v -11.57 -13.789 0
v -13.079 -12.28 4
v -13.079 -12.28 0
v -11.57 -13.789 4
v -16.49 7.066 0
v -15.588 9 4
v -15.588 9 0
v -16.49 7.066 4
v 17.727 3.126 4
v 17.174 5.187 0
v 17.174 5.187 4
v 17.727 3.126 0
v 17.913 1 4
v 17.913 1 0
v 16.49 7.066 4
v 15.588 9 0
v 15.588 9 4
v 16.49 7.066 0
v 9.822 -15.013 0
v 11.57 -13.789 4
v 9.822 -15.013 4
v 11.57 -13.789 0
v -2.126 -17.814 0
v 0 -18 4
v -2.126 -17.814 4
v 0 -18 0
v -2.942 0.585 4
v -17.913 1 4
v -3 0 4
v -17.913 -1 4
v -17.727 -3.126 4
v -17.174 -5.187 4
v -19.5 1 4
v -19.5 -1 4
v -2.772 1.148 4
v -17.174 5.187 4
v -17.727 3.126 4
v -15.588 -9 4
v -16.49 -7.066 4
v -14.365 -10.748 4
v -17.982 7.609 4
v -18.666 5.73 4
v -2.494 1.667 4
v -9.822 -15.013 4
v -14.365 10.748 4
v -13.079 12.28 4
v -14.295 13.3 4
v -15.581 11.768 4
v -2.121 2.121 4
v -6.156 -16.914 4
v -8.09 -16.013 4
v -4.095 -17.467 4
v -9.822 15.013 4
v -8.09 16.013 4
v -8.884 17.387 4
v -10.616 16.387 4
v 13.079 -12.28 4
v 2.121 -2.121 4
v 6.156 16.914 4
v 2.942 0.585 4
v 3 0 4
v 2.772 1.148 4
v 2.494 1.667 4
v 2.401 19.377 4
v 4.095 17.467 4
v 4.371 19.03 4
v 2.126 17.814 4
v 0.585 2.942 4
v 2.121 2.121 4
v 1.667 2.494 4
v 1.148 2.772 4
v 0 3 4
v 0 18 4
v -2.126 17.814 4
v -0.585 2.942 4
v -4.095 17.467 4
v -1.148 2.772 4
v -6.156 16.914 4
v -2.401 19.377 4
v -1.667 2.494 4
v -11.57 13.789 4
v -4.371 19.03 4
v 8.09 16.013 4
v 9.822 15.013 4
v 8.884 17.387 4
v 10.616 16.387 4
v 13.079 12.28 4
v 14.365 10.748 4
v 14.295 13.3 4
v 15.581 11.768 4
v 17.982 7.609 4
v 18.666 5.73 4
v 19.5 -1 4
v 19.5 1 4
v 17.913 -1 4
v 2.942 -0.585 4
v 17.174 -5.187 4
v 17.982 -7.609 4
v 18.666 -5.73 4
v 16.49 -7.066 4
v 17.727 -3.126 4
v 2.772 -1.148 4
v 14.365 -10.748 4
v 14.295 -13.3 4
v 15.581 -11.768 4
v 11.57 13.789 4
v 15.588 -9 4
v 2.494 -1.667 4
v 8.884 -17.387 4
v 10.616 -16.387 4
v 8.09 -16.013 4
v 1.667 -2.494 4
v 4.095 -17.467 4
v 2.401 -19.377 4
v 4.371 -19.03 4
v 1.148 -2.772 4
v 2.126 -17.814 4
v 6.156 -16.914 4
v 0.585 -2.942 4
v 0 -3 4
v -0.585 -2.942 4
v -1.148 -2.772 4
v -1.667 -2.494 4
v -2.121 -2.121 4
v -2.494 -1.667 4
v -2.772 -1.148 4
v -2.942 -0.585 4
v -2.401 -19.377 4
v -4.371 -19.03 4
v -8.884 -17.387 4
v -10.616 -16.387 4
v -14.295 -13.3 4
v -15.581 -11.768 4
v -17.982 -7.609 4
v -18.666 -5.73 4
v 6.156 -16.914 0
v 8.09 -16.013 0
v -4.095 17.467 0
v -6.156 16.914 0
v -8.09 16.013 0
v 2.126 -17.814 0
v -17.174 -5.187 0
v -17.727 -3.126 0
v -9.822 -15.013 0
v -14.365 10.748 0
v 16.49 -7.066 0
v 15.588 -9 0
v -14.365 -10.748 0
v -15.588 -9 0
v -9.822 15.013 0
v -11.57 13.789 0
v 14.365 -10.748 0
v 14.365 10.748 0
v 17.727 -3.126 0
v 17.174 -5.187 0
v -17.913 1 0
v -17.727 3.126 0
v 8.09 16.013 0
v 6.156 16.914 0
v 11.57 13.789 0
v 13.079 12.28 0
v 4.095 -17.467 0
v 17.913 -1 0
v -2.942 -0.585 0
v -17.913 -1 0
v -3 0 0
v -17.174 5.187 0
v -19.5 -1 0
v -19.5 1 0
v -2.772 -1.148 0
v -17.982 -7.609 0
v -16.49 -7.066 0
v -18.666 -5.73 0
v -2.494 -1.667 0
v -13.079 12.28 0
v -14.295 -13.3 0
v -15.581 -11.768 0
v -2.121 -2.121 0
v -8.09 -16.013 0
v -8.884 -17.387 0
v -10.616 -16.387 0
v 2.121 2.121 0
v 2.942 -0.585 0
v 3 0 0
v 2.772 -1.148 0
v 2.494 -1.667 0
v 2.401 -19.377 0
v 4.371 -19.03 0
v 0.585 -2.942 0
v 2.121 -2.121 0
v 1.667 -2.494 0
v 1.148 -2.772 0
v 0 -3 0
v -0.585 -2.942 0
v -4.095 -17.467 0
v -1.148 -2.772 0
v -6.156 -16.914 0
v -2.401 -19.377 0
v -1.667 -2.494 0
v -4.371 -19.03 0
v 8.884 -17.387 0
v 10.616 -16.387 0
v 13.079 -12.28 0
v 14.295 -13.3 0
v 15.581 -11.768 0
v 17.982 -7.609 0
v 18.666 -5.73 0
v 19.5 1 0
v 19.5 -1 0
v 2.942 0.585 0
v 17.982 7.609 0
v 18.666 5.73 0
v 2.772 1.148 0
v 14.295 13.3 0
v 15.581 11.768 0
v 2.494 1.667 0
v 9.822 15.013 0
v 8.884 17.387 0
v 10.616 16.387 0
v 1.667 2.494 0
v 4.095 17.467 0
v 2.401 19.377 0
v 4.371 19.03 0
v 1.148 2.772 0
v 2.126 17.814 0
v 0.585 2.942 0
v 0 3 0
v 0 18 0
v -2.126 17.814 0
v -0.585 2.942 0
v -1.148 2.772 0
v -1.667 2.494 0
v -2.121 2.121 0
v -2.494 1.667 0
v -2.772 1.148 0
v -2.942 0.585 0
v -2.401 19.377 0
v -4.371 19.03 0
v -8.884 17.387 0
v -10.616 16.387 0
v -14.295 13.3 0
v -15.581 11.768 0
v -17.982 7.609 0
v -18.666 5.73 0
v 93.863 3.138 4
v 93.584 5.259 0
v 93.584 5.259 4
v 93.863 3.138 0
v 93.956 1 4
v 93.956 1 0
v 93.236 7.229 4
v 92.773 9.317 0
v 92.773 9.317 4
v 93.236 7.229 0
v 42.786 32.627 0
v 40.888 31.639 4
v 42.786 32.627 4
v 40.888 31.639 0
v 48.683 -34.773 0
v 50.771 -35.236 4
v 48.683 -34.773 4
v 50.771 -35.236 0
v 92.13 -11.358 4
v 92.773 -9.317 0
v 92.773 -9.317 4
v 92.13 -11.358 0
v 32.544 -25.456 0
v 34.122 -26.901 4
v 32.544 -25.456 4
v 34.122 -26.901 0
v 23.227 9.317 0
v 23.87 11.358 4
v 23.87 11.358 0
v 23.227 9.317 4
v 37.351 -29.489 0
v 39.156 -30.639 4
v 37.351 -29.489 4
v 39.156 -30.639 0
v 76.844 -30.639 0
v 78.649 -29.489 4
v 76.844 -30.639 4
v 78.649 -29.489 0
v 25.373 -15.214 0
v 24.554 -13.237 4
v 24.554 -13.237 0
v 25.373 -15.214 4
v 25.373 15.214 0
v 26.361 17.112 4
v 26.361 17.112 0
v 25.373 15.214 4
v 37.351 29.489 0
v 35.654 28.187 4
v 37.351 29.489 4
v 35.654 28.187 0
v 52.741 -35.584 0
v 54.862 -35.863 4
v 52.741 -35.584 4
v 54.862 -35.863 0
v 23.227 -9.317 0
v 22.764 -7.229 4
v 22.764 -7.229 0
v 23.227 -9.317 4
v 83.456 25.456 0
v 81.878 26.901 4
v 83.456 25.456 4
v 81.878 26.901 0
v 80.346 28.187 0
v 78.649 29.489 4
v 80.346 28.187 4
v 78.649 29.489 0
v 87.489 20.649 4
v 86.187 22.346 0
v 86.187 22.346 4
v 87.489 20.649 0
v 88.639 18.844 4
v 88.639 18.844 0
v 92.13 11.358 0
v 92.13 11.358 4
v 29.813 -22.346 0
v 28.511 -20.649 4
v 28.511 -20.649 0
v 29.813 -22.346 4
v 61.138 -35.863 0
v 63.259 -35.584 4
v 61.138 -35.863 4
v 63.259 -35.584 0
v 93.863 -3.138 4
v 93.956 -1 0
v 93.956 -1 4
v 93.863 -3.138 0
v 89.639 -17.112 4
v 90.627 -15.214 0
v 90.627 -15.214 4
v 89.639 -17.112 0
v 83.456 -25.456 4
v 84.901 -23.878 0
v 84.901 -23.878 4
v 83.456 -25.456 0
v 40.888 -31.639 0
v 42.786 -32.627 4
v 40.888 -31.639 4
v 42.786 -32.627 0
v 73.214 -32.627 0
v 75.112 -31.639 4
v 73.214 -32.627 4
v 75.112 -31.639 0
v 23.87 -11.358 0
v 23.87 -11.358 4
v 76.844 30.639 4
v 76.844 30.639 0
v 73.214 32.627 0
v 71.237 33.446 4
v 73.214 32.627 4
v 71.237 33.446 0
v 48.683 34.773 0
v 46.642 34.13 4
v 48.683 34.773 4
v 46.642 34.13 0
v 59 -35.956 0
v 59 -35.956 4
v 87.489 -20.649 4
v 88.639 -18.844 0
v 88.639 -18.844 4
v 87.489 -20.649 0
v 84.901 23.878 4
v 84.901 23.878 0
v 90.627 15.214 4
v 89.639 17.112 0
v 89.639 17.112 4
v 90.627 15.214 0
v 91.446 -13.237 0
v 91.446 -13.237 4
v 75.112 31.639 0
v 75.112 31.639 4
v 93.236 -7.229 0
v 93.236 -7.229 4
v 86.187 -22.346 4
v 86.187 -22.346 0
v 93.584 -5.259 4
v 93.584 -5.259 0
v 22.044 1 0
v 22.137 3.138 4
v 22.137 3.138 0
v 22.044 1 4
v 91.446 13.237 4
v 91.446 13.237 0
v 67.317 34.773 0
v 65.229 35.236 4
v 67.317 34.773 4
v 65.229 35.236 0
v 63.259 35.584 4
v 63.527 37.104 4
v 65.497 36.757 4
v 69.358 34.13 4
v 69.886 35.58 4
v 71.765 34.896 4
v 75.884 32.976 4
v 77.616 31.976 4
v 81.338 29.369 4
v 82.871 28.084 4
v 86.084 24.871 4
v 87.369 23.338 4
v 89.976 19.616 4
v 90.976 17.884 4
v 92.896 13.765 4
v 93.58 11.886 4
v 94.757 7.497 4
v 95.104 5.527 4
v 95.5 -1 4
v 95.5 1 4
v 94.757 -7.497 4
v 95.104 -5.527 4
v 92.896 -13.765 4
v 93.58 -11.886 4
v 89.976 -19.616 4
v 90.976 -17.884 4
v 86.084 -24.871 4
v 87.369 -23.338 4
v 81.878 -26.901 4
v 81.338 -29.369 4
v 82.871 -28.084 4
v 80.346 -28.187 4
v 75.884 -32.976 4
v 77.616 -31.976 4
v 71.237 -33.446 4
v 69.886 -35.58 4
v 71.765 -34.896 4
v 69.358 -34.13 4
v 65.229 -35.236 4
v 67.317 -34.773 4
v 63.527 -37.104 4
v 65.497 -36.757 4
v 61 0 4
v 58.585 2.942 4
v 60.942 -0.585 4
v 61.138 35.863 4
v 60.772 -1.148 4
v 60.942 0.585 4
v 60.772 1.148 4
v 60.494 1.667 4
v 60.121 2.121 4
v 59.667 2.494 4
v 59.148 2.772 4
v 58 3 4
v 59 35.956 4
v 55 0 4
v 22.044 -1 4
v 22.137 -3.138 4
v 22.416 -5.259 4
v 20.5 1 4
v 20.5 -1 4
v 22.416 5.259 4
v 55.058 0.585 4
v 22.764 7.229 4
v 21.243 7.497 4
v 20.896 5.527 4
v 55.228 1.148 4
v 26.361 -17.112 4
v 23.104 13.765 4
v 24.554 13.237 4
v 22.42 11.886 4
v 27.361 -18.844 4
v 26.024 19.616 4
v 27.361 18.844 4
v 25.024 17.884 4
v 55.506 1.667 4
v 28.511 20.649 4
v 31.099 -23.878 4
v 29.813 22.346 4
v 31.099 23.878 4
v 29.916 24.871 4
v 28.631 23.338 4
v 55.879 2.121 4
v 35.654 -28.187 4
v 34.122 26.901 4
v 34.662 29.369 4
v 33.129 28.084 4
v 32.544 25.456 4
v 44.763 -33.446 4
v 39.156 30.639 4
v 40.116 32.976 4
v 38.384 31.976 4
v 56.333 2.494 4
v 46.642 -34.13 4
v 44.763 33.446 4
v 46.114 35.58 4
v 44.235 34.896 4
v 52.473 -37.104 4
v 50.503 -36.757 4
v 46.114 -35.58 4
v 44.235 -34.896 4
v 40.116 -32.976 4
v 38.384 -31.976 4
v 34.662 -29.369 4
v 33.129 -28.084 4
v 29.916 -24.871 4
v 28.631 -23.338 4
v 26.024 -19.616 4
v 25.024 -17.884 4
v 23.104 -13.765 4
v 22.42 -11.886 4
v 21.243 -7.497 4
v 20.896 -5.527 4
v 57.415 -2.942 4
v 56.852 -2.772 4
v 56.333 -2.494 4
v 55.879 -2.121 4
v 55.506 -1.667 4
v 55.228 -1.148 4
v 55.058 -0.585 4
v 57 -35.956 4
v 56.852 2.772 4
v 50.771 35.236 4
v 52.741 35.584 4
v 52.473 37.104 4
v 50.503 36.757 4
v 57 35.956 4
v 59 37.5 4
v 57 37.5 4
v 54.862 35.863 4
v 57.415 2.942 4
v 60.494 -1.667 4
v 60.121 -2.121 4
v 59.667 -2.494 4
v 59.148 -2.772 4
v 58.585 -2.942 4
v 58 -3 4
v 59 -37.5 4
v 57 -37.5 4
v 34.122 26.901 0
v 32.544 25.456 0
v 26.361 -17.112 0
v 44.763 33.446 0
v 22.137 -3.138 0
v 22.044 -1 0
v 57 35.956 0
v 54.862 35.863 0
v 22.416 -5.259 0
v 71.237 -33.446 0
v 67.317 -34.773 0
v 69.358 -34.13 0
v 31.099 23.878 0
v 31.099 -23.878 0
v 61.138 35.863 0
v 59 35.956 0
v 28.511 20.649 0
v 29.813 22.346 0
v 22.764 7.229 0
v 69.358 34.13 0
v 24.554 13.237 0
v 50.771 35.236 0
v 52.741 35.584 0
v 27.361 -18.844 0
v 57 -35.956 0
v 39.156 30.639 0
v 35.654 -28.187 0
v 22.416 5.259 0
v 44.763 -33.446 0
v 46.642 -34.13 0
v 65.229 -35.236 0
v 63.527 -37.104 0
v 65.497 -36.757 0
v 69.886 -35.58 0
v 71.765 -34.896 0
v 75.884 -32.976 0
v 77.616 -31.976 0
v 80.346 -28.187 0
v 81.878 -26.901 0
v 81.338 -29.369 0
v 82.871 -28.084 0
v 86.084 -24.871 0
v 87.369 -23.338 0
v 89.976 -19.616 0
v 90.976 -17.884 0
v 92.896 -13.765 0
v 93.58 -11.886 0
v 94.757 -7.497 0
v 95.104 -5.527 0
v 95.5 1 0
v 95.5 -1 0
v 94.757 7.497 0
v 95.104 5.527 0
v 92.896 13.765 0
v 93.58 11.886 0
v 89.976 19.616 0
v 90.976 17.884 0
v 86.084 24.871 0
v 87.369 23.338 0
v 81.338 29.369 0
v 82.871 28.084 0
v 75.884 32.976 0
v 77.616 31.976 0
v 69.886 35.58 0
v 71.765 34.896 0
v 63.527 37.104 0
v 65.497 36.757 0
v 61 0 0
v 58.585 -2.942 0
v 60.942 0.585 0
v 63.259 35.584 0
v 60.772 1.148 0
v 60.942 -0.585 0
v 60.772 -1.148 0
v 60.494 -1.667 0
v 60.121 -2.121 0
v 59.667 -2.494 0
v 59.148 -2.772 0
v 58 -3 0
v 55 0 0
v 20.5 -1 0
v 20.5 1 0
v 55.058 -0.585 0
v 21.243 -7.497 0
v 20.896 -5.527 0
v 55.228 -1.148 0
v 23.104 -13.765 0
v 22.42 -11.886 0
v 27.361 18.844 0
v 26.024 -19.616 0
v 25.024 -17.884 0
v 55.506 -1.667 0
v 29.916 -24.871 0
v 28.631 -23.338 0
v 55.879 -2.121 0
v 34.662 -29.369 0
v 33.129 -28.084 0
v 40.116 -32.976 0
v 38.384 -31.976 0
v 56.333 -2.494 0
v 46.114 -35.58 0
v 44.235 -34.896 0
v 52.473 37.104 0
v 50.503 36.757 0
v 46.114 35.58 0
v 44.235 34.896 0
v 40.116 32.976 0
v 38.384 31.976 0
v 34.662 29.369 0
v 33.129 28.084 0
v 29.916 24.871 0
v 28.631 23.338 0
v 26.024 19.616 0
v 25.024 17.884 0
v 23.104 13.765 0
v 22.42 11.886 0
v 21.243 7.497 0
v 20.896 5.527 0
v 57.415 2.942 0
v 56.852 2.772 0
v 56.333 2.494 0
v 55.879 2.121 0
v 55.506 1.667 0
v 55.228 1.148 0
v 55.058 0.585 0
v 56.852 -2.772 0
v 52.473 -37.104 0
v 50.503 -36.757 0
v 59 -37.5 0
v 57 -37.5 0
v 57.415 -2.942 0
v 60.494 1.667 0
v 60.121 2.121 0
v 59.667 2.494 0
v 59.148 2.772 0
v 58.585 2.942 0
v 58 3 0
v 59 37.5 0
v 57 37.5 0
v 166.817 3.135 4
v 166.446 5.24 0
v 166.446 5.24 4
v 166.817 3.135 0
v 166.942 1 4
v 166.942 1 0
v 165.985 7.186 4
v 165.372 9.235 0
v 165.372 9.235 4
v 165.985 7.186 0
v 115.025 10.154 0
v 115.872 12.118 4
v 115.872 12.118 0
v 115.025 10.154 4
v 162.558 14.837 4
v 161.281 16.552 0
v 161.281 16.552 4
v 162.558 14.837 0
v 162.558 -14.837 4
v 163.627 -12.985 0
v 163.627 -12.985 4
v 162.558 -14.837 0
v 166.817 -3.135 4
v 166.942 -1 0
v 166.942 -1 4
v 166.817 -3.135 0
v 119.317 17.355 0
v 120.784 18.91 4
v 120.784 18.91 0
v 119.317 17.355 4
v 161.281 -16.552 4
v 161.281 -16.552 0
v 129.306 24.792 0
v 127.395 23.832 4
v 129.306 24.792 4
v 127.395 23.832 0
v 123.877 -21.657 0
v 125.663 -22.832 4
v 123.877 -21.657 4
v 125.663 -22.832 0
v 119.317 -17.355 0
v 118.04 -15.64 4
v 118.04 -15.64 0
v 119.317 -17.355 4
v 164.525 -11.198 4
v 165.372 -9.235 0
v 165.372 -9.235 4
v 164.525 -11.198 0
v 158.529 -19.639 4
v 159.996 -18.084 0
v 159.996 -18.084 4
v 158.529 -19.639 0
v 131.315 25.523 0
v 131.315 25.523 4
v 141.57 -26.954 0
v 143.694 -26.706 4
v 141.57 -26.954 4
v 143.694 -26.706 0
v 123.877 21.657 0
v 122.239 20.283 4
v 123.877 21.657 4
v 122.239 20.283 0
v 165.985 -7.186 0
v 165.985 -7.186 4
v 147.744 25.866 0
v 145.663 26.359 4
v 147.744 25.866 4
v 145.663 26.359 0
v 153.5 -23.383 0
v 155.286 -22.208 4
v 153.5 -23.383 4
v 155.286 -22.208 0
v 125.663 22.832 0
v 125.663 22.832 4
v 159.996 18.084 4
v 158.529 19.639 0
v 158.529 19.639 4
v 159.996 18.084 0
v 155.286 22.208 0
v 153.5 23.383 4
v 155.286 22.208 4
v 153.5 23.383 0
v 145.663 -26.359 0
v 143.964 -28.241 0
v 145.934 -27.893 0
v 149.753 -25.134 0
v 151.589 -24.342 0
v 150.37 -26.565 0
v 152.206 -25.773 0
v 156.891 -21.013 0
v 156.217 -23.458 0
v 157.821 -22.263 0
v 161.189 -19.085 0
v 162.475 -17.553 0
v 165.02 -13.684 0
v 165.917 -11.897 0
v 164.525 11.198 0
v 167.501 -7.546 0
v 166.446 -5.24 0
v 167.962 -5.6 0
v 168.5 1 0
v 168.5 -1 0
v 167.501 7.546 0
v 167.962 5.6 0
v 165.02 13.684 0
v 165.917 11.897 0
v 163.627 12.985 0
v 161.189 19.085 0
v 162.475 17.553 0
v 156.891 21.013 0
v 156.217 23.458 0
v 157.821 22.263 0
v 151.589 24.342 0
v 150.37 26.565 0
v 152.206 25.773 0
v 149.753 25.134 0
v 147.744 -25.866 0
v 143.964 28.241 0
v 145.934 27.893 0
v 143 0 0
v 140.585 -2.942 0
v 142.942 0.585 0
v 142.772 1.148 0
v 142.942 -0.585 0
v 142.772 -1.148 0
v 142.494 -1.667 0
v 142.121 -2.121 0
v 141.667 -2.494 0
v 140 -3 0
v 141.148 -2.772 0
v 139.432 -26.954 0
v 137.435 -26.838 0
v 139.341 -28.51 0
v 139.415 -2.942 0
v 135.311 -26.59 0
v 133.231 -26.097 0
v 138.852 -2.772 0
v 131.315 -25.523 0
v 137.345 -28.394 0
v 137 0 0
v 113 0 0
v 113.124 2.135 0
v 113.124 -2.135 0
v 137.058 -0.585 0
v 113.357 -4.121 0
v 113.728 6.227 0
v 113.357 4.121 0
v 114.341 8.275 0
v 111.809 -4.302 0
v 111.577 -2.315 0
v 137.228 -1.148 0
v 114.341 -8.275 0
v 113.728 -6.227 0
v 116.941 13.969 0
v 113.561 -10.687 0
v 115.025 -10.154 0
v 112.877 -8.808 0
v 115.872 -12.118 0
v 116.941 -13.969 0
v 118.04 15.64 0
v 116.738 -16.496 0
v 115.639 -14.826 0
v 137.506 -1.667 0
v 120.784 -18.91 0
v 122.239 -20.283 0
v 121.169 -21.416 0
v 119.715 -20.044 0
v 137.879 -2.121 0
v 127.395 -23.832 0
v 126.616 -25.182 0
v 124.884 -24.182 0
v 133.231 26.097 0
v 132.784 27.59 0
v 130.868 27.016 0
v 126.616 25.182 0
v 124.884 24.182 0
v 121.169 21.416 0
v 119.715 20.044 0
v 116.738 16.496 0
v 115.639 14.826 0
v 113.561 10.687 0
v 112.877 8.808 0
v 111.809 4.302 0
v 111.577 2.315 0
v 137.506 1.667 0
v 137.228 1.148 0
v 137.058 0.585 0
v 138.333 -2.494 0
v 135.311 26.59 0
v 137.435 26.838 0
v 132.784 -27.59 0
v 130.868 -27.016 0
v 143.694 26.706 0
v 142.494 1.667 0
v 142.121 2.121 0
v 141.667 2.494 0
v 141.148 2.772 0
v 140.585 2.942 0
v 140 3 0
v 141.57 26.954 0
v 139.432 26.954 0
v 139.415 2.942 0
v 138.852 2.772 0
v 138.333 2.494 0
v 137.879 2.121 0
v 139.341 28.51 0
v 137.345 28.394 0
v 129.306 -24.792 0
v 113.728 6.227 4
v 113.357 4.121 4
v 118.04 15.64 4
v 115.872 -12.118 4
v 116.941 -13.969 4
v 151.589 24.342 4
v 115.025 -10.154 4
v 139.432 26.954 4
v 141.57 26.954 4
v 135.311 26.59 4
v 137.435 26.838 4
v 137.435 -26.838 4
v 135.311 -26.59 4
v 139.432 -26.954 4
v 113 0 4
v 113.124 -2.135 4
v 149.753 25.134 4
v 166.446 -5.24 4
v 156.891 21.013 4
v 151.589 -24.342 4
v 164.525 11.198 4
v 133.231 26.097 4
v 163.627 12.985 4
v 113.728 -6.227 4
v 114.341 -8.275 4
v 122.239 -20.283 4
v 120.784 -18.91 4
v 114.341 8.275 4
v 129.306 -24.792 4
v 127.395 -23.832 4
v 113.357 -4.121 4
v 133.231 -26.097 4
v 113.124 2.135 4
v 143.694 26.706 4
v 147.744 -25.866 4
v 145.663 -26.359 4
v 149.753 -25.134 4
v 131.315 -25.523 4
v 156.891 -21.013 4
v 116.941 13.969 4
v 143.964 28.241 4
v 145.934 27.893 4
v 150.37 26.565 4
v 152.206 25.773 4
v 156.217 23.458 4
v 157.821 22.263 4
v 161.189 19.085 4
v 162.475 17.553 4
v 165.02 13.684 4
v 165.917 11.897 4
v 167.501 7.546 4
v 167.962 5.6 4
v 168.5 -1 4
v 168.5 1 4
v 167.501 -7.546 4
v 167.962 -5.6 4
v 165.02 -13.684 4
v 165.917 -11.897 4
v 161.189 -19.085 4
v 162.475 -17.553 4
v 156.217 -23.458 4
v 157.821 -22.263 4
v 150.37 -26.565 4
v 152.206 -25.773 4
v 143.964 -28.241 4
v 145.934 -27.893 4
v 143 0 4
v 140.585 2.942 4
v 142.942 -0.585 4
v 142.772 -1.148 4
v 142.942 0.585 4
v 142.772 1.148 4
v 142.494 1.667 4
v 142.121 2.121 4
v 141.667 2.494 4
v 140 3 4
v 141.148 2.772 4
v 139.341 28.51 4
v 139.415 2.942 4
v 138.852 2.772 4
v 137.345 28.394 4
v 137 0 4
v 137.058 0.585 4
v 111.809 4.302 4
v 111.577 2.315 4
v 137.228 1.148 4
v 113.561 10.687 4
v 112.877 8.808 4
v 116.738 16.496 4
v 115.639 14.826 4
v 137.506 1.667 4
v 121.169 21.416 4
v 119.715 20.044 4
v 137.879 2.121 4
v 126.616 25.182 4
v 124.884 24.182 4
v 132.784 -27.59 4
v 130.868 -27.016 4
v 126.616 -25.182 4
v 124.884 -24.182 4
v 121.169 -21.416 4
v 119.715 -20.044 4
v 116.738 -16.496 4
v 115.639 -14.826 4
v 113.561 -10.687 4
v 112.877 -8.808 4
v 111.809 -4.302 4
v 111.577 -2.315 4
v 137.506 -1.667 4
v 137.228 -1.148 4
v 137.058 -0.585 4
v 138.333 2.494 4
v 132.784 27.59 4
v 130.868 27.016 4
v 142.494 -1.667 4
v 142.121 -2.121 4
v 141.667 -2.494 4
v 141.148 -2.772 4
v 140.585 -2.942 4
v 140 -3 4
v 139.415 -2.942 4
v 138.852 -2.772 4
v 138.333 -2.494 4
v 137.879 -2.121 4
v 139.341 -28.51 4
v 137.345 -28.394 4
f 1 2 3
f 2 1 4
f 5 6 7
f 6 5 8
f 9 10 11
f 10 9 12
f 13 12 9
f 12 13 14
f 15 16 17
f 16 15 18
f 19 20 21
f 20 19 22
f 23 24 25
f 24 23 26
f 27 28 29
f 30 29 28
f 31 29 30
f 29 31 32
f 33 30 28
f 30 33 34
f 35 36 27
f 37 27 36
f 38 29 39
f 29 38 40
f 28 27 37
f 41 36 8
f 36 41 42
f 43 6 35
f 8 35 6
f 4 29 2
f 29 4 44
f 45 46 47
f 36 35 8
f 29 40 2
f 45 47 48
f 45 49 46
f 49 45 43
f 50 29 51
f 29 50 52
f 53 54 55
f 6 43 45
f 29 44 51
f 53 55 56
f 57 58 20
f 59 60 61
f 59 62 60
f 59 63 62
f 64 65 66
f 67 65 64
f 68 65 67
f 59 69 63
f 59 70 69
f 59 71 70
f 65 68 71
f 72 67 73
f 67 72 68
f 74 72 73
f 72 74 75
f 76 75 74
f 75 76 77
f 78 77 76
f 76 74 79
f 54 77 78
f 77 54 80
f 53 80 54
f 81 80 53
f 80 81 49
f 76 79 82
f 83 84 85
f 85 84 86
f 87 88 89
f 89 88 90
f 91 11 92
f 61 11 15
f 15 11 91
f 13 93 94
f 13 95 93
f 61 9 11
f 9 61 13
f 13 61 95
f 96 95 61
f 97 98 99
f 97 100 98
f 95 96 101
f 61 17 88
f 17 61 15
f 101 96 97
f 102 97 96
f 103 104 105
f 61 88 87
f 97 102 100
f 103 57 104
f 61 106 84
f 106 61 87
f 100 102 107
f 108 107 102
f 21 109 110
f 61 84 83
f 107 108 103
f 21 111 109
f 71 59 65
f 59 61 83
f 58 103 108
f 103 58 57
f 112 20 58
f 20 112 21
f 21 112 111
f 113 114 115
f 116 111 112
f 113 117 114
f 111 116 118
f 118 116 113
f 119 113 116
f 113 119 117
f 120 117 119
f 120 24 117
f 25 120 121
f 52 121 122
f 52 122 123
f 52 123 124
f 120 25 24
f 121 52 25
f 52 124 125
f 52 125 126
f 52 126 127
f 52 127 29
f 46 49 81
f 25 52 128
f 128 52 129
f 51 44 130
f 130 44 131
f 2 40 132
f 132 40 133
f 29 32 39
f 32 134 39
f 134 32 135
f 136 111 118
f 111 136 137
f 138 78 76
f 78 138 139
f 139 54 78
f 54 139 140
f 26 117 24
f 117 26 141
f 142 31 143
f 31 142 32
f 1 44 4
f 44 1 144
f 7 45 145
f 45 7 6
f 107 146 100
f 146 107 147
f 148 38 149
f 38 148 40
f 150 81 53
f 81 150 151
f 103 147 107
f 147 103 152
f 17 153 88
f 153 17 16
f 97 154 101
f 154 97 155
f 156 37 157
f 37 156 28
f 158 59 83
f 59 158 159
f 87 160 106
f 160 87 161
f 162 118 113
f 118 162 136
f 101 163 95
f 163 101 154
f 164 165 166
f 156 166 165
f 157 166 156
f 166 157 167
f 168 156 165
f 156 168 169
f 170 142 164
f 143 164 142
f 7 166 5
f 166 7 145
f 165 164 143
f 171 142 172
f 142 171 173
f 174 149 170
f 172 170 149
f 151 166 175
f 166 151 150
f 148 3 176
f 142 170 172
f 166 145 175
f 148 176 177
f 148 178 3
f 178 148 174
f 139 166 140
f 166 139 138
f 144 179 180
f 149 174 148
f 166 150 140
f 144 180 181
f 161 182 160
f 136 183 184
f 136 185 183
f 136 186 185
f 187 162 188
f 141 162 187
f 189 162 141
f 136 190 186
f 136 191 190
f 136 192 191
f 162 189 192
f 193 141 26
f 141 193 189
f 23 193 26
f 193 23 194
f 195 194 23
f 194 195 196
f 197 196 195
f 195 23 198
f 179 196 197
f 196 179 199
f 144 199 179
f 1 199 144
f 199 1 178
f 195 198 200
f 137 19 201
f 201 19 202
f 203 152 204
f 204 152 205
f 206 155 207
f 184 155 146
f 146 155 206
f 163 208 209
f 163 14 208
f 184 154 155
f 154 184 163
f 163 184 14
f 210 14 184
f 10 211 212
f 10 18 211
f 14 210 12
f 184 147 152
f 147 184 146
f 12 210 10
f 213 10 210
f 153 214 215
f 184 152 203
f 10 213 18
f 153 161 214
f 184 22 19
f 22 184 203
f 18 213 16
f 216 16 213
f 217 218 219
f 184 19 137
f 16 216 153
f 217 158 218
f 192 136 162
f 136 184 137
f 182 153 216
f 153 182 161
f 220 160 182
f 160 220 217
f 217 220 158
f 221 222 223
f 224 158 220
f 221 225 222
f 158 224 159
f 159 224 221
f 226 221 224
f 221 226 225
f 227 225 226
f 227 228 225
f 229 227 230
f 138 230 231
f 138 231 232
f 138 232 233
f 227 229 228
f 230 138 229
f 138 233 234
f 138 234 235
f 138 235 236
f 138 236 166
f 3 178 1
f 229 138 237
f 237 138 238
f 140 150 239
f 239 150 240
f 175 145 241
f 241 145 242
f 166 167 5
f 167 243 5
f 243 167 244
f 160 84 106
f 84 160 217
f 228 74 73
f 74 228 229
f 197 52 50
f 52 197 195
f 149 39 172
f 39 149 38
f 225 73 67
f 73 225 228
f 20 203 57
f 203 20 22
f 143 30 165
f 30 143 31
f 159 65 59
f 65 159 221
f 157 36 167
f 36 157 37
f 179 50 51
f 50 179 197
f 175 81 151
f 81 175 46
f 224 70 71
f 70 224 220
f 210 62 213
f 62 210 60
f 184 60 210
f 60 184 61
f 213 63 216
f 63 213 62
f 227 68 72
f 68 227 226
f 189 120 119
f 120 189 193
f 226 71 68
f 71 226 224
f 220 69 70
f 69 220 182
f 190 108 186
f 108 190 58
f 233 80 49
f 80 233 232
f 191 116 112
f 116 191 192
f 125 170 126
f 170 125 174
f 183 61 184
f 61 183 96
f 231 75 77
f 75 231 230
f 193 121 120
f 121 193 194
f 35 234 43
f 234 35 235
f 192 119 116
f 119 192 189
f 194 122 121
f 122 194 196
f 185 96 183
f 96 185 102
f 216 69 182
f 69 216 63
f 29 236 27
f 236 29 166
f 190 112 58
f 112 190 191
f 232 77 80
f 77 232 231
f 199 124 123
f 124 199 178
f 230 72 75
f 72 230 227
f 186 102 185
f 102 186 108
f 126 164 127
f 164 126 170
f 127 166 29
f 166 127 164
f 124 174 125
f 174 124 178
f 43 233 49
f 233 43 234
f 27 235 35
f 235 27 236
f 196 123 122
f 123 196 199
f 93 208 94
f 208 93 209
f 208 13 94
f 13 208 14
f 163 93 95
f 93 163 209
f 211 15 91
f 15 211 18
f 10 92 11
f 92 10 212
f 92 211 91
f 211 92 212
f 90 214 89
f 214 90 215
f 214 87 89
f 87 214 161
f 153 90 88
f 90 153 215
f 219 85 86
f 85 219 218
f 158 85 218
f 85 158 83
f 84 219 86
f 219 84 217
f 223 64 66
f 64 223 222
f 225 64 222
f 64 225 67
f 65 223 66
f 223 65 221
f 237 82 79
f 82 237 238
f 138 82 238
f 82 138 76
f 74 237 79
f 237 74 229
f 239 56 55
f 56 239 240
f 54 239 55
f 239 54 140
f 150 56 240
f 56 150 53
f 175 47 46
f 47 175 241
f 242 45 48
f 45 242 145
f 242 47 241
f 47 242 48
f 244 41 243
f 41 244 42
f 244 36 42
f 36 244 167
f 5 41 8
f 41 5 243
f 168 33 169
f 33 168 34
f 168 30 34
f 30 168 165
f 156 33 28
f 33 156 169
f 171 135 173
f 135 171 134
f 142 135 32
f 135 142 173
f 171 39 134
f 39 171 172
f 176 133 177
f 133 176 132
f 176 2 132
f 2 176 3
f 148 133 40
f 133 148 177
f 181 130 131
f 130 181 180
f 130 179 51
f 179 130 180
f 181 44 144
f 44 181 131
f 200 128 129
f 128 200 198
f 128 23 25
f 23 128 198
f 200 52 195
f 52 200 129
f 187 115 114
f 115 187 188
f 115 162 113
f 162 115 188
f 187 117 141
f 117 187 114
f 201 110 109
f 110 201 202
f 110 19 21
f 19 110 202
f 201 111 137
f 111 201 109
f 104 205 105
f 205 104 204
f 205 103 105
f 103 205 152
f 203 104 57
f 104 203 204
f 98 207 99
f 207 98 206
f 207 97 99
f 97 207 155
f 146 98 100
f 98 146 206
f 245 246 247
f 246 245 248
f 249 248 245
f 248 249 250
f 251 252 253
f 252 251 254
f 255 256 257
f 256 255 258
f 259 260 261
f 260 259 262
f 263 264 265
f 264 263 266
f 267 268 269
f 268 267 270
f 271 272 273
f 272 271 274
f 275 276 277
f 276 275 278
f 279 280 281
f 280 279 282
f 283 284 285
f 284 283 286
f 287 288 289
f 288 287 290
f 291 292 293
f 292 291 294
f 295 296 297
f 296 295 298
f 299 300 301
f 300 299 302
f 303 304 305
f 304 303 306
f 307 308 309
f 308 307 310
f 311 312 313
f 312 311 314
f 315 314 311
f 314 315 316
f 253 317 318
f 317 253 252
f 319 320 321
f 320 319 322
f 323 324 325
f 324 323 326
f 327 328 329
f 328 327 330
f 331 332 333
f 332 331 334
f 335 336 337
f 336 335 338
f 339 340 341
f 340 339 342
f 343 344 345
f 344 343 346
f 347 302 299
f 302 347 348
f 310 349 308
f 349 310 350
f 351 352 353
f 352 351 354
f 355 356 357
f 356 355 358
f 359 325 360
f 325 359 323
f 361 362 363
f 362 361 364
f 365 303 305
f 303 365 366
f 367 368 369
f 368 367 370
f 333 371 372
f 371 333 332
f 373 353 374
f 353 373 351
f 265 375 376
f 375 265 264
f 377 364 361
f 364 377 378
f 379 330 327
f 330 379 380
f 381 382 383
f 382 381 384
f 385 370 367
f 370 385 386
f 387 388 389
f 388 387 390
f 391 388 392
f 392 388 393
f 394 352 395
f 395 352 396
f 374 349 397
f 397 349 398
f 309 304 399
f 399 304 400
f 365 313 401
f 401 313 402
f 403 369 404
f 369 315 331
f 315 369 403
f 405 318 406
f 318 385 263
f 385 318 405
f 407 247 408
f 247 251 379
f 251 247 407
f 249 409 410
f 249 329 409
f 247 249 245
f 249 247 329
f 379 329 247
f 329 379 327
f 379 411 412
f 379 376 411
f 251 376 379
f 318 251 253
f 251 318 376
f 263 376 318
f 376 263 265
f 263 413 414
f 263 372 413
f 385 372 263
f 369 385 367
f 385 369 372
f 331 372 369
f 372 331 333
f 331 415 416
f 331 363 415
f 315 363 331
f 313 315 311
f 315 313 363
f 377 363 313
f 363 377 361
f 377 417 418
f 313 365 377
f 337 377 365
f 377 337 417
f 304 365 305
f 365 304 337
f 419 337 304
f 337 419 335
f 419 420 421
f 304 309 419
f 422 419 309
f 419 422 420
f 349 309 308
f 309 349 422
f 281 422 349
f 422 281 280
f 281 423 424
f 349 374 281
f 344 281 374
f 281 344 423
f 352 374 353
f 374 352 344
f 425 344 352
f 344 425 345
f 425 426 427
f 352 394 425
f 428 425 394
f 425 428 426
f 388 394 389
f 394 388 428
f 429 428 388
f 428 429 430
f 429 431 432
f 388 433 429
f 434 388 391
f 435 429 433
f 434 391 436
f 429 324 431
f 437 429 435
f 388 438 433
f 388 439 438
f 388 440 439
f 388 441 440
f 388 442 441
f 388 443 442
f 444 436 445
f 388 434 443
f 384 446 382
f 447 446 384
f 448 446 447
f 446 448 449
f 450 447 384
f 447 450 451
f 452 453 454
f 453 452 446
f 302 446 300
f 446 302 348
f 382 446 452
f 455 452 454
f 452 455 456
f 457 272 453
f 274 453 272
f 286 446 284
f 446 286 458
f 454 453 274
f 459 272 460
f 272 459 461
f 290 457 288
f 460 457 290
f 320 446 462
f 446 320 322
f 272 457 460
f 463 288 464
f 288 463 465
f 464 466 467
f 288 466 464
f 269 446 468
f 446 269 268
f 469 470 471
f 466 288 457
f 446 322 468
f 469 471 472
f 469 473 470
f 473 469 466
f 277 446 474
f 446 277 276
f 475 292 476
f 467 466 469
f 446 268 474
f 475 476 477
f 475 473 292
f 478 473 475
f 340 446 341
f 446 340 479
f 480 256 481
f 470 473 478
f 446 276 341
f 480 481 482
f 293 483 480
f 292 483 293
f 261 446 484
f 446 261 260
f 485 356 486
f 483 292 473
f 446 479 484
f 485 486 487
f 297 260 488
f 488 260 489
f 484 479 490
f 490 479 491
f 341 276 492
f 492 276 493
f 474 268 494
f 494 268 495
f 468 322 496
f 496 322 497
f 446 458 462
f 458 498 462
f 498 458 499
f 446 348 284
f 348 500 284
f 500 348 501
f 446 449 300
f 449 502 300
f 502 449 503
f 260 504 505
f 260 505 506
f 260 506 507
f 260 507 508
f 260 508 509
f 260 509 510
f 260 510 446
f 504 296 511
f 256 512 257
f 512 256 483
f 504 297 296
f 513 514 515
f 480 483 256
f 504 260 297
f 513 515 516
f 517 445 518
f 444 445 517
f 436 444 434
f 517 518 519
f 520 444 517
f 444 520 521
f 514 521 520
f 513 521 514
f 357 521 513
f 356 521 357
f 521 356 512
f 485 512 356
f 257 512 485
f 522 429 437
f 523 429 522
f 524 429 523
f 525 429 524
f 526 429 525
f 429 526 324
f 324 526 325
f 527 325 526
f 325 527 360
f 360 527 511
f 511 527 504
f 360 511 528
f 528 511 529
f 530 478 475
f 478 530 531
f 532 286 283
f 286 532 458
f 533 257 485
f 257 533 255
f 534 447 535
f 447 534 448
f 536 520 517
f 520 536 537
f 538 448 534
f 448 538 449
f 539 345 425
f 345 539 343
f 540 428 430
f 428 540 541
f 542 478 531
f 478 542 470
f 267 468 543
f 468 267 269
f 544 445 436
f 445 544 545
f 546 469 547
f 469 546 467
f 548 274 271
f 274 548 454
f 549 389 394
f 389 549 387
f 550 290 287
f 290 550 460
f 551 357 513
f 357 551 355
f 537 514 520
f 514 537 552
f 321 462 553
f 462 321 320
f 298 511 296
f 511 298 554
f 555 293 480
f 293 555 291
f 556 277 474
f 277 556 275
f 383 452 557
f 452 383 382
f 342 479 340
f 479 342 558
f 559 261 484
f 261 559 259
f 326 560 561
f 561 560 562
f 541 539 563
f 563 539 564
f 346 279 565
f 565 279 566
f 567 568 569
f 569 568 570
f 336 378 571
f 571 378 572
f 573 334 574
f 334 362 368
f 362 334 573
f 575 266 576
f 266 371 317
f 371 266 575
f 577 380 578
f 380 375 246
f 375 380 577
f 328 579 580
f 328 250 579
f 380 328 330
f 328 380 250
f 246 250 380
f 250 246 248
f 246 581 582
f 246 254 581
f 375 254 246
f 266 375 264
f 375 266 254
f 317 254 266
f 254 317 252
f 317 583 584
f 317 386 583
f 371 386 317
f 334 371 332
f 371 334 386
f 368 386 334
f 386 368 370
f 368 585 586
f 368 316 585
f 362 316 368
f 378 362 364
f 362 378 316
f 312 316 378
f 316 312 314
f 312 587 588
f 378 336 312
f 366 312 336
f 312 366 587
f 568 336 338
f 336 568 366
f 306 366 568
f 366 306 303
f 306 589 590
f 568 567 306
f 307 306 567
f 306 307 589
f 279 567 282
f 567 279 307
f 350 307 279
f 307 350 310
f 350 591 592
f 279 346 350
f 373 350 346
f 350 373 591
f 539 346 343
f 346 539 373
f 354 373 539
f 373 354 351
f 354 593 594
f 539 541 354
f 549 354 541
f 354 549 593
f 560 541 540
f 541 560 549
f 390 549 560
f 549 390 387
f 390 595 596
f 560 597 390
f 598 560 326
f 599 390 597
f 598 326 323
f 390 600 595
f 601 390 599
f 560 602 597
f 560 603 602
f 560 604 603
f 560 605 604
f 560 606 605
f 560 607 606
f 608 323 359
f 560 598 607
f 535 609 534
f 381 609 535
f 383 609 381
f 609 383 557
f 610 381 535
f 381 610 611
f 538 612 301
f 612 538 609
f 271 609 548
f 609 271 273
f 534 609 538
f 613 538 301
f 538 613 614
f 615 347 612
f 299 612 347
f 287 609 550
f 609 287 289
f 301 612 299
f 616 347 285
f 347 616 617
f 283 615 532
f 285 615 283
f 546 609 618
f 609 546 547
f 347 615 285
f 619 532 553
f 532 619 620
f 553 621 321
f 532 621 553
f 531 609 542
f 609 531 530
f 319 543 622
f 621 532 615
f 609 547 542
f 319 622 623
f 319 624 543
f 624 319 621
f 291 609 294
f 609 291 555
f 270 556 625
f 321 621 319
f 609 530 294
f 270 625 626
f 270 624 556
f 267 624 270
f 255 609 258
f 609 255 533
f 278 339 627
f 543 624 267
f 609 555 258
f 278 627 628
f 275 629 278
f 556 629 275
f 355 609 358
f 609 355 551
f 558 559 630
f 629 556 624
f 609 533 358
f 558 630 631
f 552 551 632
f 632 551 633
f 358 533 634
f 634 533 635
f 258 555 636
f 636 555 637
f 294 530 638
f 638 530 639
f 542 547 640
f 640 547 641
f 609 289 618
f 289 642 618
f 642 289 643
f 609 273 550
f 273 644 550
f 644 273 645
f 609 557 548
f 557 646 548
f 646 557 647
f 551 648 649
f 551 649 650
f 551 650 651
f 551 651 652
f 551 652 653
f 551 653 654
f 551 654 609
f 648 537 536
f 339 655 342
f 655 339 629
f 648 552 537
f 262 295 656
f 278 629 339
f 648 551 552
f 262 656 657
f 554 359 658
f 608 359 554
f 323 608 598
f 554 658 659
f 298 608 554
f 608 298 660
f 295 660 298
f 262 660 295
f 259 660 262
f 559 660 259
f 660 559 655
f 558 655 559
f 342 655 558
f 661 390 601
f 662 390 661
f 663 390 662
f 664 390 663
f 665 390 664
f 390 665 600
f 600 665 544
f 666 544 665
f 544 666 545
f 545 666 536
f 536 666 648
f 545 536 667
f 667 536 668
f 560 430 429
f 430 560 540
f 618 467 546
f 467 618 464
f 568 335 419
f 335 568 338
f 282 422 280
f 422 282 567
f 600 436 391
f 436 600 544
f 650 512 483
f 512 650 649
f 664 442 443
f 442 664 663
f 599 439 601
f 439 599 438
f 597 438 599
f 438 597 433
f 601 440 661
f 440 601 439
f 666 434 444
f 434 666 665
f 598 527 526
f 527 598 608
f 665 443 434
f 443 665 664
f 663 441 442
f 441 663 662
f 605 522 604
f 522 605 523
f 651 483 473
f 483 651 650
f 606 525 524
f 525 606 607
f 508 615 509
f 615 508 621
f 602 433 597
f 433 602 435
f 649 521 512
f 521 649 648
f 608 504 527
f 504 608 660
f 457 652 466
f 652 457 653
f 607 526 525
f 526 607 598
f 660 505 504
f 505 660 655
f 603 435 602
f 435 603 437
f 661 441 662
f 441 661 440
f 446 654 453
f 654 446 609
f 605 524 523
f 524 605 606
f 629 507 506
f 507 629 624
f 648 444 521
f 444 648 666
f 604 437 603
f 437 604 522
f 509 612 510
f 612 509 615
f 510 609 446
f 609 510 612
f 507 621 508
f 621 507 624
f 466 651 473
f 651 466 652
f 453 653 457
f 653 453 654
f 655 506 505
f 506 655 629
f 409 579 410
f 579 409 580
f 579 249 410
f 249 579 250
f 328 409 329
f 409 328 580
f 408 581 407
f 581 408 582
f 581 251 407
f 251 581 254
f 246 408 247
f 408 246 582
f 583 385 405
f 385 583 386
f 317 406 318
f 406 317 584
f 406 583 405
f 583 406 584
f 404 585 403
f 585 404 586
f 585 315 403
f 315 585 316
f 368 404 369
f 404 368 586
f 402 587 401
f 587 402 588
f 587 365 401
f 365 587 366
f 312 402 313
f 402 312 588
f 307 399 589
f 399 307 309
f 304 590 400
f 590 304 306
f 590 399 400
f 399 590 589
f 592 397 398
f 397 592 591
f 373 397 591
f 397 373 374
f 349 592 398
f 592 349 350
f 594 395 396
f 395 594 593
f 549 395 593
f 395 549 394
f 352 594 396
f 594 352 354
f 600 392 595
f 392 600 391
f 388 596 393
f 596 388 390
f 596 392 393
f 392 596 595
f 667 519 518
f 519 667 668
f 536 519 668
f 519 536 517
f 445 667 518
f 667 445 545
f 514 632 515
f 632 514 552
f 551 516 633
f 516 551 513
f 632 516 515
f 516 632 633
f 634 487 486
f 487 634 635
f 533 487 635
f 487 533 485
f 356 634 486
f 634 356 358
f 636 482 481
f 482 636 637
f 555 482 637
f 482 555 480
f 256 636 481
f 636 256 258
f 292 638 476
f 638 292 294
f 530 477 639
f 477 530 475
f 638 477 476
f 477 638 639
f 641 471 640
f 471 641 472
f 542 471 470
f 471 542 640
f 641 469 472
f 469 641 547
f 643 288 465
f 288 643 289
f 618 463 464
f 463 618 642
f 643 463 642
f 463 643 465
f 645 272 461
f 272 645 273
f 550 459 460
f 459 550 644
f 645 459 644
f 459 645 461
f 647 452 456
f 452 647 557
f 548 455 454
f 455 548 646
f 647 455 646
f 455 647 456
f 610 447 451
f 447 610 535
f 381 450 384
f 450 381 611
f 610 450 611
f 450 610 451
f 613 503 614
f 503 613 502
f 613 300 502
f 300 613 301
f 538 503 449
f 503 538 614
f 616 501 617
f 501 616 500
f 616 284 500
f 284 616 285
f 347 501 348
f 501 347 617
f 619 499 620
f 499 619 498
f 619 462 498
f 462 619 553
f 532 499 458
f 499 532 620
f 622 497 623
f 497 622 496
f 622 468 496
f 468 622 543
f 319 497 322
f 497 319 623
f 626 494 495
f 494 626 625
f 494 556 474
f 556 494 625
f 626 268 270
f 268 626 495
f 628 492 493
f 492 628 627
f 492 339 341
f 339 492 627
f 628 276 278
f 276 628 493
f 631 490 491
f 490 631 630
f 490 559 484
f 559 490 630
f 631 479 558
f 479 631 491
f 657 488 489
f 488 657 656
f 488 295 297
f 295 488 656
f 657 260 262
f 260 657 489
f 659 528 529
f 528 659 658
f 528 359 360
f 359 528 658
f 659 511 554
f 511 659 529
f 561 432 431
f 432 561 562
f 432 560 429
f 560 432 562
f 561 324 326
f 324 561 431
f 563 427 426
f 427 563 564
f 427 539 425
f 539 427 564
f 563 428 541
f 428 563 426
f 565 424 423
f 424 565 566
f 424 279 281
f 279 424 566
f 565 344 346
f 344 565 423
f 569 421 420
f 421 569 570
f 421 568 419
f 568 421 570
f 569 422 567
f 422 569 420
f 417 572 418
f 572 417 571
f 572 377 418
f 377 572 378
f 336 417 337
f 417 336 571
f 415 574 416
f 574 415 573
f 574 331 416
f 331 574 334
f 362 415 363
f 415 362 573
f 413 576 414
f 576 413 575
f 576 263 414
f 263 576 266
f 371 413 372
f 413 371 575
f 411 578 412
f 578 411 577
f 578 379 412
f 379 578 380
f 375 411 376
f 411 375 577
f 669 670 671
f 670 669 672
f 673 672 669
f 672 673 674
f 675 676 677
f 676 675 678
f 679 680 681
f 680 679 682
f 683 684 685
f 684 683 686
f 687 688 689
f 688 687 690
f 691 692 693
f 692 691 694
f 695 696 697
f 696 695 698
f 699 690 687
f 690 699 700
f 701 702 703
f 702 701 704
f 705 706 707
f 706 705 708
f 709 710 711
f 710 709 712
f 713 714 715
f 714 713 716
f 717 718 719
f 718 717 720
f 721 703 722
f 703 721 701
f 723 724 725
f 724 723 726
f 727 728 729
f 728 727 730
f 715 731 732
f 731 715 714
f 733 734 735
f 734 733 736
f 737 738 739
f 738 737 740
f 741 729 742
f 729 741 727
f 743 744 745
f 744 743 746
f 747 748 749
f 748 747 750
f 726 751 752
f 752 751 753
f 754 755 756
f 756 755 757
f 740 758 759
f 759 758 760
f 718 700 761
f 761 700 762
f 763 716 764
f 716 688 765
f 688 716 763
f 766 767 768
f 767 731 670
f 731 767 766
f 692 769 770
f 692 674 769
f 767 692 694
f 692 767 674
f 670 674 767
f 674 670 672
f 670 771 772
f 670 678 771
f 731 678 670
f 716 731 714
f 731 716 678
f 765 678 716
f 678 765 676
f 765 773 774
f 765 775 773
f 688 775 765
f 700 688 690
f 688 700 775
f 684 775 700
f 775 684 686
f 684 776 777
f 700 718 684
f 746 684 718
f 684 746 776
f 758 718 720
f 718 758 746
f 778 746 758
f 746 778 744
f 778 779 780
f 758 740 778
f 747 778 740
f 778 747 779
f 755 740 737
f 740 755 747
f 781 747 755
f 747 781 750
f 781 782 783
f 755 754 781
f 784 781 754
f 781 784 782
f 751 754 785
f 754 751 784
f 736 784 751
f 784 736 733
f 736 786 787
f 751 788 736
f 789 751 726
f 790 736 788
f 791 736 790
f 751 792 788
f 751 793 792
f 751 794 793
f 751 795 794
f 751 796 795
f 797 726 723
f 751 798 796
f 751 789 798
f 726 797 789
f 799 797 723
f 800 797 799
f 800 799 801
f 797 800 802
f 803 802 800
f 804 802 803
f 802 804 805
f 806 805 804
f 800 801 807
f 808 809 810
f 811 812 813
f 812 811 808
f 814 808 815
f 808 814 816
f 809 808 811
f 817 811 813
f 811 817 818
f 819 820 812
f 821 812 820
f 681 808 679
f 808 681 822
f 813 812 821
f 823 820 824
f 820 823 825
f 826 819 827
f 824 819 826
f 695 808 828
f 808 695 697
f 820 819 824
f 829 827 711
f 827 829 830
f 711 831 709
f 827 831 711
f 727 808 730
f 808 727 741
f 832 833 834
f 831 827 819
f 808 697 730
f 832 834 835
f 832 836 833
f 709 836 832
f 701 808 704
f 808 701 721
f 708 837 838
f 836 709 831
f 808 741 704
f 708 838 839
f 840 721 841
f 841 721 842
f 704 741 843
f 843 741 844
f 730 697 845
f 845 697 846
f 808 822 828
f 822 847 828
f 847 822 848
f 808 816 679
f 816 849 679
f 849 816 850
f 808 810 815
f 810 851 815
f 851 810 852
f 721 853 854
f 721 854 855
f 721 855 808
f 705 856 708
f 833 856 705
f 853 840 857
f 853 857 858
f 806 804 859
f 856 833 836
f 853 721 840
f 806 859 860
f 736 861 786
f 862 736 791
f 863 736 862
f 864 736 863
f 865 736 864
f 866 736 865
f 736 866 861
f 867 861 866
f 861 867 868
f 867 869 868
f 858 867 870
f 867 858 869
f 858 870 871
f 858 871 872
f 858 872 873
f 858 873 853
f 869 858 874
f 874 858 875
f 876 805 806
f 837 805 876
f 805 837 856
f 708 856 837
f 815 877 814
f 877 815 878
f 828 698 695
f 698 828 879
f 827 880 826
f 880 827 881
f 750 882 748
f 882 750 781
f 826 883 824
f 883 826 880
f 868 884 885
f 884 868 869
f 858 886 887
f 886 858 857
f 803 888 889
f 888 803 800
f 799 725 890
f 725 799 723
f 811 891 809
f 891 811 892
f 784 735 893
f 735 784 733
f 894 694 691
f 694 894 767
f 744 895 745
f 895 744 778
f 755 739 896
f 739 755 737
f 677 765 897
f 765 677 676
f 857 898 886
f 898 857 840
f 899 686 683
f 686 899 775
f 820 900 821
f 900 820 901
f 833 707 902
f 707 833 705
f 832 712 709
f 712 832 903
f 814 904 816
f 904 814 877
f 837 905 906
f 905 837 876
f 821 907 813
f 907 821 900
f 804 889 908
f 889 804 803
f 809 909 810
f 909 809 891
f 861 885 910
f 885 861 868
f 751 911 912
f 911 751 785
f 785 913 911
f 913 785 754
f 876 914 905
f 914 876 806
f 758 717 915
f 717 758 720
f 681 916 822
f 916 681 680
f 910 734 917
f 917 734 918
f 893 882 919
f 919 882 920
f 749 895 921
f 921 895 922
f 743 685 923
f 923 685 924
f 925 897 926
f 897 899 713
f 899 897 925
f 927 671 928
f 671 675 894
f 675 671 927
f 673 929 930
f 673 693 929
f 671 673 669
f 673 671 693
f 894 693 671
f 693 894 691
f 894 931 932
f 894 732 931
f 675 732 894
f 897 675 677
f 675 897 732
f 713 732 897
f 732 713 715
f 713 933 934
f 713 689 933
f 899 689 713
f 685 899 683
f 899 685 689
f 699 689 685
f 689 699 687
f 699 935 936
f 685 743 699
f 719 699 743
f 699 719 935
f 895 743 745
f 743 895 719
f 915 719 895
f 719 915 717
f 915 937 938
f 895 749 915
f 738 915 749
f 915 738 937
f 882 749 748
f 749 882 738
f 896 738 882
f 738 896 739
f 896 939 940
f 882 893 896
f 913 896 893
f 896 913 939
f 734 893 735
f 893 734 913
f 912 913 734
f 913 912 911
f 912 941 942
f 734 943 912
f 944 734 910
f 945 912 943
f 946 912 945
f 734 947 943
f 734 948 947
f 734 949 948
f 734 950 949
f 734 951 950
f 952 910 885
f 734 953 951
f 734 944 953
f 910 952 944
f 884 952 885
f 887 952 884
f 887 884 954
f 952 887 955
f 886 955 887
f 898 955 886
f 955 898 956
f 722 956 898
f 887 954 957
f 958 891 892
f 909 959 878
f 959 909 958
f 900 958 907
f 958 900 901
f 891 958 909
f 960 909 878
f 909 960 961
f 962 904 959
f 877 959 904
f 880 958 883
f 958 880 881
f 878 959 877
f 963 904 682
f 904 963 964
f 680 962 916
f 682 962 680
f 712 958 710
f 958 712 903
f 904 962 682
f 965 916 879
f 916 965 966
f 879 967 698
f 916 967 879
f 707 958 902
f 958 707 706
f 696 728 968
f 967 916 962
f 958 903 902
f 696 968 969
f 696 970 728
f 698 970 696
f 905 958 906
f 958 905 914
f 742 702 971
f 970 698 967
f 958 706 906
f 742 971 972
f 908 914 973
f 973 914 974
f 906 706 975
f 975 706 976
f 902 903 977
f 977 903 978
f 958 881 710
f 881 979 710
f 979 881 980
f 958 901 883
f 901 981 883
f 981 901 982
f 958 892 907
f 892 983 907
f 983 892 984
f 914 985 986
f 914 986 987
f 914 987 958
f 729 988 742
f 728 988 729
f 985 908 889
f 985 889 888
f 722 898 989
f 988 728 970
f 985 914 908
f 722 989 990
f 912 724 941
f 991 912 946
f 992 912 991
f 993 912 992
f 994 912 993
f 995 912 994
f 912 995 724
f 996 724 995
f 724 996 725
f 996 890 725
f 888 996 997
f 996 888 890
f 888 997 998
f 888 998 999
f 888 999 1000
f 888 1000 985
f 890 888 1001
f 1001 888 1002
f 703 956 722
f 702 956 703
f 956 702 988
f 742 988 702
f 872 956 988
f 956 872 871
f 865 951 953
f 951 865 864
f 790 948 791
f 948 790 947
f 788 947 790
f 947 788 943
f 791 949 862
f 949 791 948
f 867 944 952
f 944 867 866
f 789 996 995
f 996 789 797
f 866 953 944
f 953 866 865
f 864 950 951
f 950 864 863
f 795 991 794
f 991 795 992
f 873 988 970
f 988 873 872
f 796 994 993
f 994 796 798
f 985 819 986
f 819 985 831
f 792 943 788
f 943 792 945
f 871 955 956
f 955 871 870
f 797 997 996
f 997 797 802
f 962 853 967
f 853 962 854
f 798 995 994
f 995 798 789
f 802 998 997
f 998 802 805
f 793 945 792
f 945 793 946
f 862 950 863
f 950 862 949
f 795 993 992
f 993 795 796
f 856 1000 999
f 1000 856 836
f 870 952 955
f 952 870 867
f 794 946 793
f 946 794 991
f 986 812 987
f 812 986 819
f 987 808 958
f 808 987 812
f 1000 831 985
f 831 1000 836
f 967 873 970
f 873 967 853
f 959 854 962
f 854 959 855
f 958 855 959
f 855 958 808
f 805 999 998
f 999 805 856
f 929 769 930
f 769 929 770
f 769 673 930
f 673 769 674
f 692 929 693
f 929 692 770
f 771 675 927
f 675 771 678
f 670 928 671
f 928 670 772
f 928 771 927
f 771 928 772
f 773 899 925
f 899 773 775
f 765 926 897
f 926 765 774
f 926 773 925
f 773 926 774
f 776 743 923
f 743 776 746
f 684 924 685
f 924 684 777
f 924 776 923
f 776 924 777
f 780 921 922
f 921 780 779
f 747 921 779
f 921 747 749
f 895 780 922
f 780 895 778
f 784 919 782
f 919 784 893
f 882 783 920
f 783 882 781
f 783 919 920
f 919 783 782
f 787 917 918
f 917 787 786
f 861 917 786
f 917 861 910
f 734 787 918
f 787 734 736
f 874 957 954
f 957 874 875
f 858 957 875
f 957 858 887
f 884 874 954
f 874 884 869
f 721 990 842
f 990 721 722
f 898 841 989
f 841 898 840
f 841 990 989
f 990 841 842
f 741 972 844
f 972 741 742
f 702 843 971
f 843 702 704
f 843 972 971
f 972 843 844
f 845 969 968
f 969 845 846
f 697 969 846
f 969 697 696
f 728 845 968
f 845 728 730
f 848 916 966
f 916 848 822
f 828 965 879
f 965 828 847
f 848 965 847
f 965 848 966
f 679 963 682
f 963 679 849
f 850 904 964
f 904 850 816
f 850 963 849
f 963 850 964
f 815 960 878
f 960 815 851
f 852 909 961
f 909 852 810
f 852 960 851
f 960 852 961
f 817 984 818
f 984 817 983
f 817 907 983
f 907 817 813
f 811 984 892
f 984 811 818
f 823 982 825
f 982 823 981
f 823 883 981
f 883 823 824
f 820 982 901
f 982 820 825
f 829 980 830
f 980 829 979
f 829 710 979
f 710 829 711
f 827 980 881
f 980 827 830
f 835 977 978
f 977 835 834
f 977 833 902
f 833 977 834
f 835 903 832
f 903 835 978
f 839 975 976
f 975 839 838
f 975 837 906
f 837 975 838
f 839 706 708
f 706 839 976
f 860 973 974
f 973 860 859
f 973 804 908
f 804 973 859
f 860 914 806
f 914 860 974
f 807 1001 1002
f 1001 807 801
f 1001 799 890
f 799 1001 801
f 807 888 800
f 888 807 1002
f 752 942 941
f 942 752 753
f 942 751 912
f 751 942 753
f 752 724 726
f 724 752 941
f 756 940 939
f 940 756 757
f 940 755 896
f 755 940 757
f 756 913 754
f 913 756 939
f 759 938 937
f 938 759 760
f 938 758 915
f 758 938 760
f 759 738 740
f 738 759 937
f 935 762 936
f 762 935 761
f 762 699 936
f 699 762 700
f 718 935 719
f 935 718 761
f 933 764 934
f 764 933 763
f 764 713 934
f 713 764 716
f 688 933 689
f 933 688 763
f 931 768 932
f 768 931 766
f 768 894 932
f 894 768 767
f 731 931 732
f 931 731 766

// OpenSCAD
/*
Title: Gear Ratio Visualizer Board
Folder: 17_robotics_applications
Physics Topic: Gear ratio and angular speed
Difficulty: Beginner-Intermediate
Print Type: FDM, single material
Teaches: Input/output ratio and speed-torque tradeoffs for FTC drivetrains
Use Case: Classroom manipulative
*/


// --------------------
// Parameters
// --------------------
gear_ds = [36,72,54];
thickness = 4;

module simple_gear(d=40, teeth=20){
    difference(){
        cylinder(h=thickness,d=d,$fn=teeth*2);
        cylinder(h=thickness+0.1,d=6,$fn=32);
    }
    for(a=[0:360/teeth:359])
        rotate([0,0,a]) translate([d/2,0,thickness/2]) cube([3,2,thickness],center=true);
}

simple_gear(gear_ds[0],18);
translate([58,0,0]) simple_gear(gear_ds[1],36);
translate([140,0,0]) simple_gear(gear_ds[2],27);
